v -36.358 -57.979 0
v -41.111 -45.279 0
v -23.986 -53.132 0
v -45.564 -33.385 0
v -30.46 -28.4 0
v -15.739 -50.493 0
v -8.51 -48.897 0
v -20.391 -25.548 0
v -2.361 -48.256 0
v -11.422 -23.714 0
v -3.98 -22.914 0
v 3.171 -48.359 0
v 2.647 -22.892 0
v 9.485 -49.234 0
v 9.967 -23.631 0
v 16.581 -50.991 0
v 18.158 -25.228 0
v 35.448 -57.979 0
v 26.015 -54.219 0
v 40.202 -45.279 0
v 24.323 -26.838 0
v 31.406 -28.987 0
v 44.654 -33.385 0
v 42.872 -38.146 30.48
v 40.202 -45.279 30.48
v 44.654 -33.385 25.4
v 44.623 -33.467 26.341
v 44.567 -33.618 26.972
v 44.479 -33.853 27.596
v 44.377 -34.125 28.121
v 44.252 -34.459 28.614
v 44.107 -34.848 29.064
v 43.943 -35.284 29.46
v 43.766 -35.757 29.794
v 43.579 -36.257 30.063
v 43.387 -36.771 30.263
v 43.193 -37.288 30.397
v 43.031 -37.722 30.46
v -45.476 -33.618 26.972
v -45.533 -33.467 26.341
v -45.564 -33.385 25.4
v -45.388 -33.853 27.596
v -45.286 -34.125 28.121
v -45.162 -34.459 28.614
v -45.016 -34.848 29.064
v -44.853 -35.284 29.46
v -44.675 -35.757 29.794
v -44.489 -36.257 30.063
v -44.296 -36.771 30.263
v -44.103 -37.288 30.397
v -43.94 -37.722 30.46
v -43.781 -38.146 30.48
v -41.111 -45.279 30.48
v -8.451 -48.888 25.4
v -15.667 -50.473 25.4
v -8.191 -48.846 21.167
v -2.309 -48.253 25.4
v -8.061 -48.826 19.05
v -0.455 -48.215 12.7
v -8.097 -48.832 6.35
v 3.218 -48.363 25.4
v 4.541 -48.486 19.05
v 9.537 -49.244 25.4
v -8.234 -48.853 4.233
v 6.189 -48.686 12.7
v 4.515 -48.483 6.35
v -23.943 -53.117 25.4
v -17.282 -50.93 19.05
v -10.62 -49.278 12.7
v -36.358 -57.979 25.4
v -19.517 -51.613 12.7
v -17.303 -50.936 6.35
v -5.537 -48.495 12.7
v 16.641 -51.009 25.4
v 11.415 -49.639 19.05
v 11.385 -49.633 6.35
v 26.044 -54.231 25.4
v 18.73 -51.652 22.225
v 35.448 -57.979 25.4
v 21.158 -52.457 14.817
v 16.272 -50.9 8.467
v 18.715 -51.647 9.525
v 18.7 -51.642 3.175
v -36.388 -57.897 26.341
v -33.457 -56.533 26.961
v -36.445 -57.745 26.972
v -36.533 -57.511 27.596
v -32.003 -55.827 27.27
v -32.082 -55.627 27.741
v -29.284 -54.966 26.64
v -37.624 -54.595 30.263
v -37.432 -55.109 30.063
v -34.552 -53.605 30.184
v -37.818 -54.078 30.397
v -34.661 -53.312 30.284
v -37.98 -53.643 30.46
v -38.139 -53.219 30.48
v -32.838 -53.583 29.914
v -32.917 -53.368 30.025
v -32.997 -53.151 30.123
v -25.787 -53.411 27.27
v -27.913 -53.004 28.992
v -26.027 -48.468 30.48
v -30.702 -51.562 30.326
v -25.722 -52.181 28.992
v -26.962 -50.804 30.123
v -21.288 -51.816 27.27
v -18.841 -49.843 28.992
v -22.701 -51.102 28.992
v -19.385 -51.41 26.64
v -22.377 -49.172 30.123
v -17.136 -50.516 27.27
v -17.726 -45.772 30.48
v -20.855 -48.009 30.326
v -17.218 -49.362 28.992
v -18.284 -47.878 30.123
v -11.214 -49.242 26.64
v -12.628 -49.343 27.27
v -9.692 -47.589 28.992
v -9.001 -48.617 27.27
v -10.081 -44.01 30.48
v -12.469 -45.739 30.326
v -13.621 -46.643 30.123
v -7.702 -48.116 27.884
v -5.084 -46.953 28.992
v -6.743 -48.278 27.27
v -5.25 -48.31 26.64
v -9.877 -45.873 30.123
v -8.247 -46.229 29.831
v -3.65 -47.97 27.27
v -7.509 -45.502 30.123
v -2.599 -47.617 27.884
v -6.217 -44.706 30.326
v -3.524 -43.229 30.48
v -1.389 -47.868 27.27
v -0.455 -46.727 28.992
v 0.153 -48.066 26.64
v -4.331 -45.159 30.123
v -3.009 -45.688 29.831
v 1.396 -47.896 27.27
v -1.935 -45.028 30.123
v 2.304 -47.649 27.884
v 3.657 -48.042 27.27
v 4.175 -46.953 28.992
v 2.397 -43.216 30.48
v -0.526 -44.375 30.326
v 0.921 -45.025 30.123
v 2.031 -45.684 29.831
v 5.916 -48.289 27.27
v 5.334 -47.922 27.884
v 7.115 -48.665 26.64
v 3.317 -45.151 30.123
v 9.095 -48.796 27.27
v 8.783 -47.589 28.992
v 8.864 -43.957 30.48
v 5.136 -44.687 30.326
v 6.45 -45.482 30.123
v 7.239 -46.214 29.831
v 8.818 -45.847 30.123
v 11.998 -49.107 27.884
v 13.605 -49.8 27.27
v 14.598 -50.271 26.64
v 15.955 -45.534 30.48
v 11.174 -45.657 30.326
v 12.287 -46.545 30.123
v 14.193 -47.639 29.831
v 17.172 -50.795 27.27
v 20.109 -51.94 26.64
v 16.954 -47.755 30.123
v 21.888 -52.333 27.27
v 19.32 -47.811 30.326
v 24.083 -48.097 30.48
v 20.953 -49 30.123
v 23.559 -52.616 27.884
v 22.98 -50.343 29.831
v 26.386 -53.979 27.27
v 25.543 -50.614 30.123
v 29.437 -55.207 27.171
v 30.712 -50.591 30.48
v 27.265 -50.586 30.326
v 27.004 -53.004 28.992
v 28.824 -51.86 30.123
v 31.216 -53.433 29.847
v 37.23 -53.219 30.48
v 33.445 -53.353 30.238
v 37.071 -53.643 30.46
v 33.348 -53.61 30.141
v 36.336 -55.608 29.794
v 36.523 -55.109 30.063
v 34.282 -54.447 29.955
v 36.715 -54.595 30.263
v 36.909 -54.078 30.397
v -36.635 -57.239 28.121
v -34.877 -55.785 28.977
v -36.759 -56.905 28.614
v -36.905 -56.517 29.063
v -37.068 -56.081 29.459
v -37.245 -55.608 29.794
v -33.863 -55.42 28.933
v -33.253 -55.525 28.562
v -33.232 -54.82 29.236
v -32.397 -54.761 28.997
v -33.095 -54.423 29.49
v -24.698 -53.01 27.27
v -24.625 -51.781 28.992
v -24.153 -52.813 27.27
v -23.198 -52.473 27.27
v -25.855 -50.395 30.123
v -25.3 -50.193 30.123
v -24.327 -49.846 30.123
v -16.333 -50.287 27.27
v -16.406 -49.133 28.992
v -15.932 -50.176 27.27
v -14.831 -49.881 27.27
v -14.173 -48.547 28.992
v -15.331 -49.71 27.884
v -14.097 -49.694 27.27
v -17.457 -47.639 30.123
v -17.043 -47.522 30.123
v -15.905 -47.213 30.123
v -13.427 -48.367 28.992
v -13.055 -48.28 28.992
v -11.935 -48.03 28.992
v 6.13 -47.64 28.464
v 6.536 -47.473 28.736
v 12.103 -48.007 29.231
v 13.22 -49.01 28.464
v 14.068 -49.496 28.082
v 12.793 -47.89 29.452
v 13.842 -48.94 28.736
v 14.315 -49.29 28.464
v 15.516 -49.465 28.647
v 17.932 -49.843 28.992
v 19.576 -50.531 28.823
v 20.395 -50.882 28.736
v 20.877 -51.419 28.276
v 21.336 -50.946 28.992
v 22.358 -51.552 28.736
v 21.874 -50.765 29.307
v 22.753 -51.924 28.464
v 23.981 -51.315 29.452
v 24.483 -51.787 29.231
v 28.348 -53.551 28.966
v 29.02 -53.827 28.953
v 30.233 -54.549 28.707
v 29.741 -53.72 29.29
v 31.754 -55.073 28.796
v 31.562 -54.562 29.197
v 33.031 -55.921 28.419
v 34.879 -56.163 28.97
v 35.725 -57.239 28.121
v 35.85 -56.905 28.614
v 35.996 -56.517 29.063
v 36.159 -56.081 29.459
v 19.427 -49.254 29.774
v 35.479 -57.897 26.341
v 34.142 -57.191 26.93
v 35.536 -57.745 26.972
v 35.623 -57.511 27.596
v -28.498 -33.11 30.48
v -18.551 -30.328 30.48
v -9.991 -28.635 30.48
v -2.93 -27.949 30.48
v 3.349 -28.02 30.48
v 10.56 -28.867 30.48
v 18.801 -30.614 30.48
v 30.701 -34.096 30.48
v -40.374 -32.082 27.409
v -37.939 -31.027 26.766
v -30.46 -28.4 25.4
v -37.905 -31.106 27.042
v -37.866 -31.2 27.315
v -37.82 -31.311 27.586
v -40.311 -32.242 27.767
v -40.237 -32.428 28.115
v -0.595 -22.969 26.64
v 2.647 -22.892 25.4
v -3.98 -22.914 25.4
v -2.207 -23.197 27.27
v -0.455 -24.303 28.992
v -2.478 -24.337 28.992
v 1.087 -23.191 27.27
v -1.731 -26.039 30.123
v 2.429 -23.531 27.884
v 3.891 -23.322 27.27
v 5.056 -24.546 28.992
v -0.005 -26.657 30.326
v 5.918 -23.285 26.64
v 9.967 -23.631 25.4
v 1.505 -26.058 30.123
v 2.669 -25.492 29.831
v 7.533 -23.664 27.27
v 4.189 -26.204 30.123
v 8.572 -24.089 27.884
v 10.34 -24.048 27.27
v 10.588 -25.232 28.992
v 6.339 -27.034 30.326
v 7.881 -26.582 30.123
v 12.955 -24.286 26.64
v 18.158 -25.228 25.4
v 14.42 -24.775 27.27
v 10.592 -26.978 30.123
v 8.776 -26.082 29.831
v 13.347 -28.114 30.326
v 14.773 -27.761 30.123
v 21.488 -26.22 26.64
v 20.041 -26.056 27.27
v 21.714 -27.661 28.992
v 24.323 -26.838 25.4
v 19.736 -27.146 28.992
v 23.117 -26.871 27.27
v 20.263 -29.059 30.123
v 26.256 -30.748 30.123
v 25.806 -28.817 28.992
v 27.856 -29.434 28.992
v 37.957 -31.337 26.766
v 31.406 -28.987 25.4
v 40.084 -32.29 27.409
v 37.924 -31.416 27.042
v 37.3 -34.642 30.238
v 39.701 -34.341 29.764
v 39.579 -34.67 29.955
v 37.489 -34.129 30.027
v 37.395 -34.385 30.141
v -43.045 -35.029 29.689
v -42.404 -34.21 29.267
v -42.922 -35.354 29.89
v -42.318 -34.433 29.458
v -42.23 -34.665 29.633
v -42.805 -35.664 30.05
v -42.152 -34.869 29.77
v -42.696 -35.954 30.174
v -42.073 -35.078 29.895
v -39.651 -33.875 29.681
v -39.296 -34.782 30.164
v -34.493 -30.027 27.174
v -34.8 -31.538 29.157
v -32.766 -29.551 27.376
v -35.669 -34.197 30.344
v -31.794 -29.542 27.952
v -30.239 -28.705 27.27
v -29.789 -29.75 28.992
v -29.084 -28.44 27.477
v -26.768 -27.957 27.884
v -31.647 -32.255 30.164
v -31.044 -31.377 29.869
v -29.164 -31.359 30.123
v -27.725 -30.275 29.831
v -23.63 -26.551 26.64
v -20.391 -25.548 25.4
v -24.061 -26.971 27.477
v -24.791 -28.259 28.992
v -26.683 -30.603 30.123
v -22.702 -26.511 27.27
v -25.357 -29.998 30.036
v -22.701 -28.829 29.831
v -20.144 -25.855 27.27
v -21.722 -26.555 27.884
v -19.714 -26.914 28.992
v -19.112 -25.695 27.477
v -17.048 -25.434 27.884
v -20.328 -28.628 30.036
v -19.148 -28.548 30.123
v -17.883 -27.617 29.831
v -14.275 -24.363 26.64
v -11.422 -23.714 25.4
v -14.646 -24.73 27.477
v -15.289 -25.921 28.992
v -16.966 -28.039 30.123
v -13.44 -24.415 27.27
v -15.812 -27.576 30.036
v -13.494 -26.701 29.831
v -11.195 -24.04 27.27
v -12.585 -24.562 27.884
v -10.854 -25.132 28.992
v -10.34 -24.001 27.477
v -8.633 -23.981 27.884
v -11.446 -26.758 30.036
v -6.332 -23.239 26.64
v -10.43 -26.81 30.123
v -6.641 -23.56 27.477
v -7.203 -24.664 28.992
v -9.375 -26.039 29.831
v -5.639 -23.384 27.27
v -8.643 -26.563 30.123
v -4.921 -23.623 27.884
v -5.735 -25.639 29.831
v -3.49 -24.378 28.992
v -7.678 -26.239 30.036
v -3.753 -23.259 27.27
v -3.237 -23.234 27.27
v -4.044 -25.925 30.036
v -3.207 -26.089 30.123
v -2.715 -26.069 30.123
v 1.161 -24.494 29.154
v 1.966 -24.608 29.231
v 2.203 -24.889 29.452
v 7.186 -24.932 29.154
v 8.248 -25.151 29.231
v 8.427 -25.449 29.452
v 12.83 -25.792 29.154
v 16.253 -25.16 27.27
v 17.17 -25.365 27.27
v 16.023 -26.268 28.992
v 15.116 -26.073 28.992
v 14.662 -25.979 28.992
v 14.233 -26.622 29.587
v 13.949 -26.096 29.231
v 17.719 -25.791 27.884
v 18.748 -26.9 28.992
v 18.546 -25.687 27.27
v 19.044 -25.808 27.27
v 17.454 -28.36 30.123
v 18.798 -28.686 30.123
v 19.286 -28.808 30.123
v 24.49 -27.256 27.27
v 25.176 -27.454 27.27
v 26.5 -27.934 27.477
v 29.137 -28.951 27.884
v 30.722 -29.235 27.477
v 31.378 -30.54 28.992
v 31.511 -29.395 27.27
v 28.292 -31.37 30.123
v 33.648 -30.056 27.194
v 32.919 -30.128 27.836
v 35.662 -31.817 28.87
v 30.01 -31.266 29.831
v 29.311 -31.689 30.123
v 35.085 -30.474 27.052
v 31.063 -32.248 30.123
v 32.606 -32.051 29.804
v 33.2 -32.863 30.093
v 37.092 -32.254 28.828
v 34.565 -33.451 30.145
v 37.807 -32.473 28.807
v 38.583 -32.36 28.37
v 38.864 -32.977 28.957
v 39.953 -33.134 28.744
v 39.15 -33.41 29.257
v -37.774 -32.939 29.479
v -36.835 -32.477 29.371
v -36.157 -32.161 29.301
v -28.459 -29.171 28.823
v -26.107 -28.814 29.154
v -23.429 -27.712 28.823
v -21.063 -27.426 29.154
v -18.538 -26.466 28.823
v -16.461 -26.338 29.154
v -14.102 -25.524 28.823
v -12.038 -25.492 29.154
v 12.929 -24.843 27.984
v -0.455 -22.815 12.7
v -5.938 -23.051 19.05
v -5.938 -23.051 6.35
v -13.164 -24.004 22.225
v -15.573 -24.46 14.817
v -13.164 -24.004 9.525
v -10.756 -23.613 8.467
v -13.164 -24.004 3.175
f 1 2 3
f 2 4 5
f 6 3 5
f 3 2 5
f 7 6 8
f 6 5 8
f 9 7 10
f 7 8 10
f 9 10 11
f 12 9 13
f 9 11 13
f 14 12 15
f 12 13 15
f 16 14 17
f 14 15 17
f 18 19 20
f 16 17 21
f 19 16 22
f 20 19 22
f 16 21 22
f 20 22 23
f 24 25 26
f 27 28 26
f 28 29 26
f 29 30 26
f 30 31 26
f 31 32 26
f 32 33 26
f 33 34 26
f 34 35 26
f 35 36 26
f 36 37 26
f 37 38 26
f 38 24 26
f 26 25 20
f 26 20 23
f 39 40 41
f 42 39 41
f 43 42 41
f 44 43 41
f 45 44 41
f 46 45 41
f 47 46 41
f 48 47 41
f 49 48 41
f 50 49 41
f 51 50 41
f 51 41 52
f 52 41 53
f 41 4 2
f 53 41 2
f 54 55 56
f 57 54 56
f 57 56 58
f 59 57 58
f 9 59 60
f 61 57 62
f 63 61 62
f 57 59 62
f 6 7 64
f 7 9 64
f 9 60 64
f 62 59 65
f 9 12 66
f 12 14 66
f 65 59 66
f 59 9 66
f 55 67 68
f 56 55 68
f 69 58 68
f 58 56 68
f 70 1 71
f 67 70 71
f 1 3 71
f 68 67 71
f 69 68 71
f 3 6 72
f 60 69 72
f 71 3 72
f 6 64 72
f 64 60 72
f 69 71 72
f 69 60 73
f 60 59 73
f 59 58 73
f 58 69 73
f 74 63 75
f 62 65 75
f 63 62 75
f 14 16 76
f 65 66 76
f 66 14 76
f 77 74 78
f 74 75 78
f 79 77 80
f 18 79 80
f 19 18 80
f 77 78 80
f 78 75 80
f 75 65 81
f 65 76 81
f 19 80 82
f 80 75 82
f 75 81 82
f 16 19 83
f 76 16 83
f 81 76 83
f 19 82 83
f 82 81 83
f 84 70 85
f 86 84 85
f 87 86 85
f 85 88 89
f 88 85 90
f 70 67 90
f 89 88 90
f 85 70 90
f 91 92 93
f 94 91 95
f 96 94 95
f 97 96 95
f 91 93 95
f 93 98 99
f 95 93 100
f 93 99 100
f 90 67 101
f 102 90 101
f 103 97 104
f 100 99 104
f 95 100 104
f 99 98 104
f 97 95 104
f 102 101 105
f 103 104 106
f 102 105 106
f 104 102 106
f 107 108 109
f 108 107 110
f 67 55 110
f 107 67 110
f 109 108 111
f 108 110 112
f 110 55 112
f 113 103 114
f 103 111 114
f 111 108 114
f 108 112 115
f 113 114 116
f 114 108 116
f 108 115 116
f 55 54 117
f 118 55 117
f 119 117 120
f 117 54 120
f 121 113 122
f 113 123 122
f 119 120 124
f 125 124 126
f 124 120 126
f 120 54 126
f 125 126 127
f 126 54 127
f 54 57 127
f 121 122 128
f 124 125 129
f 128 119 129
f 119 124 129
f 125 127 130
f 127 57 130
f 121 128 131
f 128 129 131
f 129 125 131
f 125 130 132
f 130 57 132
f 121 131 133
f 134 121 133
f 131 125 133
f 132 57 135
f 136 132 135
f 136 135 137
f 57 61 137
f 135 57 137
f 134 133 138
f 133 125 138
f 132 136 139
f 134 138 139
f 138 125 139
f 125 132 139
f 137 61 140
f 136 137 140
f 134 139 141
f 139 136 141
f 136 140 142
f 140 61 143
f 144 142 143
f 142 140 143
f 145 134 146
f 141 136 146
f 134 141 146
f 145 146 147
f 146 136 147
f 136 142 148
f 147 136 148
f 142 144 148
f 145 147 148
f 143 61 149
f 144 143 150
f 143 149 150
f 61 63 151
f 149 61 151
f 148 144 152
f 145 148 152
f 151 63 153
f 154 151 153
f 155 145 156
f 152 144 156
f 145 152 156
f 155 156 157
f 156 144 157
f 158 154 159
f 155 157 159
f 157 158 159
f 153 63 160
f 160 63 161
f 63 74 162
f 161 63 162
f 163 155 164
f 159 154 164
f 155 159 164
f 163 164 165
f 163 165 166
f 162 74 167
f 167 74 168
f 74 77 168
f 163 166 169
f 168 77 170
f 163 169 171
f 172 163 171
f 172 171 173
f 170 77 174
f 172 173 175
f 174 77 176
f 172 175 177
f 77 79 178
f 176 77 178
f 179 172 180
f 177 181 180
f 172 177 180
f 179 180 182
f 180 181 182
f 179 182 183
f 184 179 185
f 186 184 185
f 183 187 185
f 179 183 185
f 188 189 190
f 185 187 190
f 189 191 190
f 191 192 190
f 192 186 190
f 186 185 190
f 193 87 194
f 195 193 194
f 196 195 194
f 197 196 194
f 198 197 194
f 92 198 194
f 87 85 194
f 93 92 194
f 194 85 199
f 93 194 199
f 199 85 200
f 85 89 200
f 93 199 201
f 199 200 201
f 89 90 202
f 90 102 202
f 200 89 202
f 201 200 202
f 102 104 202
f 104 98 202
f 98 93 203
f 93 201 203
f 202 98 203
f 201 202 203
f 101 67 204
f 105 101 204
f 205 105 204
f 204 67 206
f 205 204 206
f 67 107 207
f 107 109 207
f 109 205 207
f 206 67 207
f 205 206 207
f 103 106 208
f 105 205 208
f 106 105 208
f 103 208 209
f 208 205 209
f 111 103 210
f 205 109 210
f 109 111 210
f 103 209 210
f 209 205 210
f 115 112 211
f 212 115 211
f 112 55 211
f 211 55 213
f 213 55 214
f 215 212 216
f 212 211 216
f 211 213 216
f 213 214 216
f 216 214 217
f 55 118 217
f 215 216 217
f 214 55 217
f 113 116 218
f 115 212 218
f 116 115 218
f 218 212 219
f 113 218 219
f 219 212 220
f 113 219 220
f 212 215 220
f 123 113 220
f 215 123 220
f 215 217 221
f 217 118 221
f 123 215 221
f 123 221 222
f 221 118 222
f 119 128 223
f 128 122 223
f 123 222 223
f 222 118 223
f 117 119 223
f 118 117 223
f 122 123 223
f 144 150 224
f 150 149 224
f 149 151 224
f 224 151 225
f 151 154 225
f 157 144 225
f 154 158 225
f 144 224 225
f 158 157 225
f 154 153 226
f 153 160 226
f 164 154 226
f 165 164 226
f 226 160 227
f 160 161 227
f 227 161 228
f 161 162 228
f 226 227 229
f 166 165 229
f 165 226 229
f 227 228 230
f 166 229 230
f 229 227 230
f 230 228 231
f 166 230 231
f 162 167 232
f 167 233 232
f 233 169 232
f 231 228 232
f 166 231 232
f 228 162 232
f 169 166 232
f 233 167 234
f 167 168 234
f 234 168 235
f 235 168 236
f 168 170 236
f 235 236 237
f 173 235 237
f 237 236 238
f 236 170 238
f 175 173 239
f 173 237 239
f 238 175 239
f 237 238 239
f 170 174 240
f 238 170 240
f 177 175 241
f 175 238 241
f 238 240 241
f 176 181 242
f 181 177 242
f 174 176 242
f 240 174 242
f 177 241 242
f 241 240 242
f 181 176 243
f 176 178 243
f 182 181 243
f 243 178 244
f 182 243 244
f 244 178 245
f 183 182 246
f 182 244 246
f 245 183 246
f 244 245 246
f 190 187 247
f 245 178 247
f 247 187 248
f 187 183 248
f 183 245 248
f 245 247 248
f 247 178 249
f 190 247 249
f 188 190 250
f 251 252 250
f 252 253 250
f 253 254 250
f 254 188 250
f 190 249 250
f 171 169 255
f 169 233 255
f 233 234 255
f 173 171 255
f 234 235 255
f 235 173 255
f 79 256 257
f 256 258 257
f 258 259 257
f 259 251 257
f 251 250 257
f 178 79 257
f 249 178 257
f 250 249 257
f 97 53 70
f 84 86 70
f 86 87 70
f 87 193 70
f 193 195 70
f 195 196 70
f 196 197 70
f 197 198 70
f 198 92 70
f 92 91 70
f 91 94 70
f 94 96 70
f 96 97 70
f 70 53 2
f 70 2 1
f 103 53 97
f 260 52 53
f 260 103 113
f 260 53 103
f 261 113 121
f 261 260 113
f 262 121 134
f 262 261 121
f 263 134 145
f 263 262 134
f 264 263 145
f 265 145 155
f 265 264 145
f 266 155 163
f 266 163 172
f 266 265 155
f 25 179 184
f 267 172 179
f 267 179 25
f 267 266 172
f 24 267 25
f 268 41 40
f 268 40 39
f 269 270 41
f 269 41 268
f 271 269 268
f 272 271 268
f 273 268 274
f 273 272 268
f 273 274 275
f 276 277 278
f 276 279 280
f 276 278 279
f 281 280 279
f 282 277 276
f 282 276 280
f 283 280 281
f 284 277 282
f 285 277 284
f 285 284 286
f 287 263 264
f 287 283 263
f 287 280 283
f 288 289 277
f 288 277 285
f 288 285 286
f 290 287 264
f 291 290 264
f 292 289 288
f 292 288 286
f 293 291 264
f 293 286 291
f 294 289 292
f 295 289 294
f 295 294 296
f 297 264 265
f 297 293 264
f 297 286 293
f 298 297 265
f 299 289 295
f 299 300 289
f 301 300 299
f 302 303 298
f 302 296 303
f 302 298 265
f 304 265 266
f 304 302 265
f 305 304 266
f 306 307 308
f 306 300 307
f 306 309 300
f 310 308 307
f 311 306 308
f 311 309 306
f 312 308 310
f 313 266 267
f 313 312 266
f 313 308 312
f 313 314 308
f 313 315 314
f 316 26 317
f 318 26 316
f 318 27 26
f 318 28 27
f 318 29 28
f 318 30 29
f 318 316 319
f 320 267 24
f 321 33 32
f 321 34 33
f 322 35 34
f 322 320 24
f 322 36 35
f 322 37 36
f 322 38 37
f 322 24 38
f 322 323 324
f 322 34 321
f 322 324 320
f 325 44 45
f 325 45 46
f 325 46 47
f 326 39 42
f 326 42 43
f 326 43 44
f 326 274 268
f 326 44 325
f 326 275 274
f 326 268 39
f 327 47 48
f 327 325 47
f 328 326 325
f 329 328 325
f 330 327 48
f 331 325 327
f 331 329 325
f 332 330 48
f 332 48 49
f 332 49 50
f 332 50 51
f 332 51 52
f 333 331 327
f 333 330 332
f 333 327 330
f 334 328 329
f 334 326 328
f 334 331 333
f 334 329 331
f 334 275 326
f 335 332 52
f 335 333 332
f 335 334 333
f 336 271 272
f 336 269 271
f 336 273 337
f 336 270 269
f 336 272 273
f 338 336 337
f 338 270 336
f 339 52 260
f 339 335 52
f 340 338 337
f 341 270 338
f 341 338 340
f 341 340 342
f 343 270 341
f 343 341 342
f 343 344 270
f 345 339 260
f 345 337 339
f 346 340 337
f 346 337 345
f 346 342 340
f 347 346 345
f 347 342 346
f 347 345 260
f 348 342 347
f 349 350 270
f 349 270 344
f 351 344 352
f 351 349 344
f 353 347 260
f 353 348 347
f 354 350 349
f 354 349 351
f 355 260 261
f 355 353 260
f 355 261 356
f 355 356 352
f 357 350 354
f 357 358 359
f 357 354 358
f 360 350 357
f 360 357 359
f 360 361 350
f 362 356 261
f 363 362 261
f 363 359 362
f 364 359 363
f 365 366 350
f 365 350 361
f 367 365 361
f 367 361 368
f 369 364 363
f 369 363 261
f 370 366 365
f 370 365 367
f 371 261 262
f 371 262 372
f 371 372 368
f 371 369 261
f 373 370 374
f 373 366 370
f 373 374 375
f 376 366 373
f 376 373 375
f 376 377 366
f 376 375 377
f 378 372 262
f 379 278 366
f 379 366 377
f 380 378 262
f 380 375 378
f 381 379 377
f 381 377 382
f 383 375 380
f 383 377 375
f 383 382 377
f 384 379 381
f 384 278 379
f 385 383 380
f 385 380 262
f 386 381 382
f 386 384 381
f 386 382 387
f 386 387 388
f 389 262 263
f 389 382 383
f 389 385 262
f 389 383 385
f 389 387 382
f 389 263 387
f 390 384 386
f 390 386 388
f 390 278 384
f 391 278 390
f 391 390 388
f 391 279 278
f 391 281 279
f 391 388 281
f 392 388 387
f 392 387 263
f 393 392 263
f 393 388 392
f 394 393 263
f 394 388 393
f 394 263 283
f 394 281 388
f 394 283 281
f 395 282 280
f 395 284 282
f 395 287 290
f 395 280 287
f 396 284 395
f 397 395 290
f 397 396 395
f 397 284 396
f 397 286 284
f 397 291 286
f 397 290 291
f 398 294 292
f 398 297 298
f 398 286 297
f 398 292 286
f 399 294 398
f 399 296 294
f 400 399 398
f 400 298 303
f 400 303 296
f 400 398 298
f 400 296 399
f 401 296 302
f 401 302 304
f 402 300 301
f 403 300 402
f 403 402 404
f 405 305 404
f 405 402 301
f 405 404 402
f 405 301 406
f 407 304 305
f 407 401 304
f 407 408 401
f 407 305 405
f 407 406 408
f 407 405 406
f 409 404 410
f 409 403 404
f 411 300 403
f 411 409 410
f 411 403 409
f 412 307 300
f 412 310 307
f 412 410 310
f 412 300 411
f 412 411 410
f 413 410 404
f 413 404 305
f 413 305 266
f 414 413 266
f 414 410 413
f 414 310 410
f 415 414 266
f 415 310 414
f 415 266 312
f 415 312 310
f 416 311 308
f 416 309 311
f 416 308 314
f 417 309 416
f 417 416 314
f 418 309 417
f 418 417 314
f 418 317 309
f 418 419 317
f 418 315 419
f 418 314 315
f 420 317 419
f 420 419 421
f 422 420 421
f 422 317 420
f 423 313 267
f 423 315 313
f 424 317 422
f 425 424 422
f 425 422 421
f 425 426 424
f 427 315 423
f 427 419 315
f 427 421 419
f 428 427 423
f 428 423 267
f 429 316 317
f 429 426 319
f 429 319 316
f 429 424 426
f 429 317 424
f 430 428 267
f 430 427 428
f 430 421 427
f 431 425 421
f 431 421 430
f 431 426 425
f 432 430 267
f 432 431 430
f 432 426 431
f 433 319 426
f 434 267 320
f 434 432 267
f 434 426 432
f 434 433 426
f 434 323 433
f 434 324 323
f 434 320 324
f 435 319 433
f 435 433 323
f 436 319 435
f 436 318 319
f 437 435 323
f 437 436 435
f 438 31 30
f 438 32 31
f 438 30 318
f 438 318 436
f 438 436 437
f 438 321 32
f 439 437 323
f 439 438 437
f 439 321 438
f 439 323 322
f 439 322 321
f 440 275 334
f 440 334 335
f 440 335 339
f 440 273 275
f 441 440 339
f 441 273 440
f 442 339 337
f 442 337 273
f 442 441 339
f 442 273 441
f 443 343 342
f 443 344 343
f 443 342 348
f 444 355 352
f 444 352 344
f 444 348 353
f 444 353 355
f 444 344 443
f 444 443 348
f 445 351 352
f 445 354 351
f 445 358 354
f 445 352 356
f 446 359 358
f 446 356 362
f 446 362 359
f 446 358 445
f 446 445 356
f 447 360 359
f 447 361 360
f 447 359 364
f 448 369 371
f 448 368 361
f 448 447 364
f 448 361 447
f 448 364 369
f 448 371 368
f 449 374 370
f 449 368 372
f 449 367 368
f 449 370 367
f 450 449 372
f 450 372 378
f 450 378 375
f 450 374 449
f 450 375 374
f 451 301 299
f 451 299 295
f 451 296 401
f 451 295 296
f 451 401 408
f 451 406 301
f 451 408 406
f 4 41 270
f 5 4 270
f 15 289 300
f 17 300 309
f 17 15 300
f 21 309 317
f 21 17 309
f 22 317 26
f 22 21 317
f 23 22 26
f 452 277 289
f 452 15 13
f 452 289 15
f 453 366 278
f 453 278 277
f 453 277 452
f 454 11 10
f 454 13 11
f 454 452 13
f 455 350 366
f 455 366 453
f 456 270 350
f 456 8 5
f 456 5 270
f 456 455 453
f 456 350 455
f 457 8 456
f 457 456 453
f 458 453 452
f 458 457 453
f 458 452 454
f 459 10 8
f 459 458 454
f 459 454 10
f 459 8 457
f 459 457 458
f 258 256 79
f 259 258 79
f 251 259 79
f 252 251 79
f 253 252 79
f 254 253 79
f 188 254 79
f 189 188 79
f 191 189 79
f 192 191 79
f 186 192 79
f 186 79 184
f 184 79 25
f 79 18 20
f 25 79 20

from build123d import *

# Parameters (mm, degrees)
F1_DEPTH = 30.48
F2_R     = 5.08


with BuildPart() as f1:
    # F0 (on Top) → F1 (new body)
    with BuildSketch(Plane.XY):
        with BuildLine():
            Line((-45.563514, -33.3848), (-41.111397, -45.278859))
            Line((-41.111397, -45.278859), (-36.357604, -57.978859))
            add(Edge.make_bspline(
                [(-36.357604, -57.978859), (-24.389937, -53.096968), (-0.454603, -43.333187), (23.480731, -53.096968), (35.448398, -57.978859)],
                knots=[0, 0, 0, 0, 37.206947, 74.413894, 74.413894, 74.413894, 74.413894], degree=3))
            Line((35.448398, -57.978859), (40.202191, -45.278859))
            Line((40.202191, -45.278859), (44.654308, -33.3848))
            add(Edge.make_bspline(
                [(-45.563514, -33.3848), (-30.527211, -28.382681), (-0.454603, -17.247475), (29.618004, -28.382681), (44.654308, -33.3848)],
                knots=[0, 0, 0, 0, 46.330691, 92.661381, 92.661381, 92.661381, 92.661381], degree=3))
        make_face()
    extrude(amount=F1_DEPTH)

    # F2
    f2_edges = [f1.edges().sort_by_distance(p)[0] for p in [
        (-0.454603, -48.215078, 30.48),
        (-0.454603, -22.815078, 30.48),
    ]]
    fillet(f2_edges, radius=F2_R)


solid = f1.part
